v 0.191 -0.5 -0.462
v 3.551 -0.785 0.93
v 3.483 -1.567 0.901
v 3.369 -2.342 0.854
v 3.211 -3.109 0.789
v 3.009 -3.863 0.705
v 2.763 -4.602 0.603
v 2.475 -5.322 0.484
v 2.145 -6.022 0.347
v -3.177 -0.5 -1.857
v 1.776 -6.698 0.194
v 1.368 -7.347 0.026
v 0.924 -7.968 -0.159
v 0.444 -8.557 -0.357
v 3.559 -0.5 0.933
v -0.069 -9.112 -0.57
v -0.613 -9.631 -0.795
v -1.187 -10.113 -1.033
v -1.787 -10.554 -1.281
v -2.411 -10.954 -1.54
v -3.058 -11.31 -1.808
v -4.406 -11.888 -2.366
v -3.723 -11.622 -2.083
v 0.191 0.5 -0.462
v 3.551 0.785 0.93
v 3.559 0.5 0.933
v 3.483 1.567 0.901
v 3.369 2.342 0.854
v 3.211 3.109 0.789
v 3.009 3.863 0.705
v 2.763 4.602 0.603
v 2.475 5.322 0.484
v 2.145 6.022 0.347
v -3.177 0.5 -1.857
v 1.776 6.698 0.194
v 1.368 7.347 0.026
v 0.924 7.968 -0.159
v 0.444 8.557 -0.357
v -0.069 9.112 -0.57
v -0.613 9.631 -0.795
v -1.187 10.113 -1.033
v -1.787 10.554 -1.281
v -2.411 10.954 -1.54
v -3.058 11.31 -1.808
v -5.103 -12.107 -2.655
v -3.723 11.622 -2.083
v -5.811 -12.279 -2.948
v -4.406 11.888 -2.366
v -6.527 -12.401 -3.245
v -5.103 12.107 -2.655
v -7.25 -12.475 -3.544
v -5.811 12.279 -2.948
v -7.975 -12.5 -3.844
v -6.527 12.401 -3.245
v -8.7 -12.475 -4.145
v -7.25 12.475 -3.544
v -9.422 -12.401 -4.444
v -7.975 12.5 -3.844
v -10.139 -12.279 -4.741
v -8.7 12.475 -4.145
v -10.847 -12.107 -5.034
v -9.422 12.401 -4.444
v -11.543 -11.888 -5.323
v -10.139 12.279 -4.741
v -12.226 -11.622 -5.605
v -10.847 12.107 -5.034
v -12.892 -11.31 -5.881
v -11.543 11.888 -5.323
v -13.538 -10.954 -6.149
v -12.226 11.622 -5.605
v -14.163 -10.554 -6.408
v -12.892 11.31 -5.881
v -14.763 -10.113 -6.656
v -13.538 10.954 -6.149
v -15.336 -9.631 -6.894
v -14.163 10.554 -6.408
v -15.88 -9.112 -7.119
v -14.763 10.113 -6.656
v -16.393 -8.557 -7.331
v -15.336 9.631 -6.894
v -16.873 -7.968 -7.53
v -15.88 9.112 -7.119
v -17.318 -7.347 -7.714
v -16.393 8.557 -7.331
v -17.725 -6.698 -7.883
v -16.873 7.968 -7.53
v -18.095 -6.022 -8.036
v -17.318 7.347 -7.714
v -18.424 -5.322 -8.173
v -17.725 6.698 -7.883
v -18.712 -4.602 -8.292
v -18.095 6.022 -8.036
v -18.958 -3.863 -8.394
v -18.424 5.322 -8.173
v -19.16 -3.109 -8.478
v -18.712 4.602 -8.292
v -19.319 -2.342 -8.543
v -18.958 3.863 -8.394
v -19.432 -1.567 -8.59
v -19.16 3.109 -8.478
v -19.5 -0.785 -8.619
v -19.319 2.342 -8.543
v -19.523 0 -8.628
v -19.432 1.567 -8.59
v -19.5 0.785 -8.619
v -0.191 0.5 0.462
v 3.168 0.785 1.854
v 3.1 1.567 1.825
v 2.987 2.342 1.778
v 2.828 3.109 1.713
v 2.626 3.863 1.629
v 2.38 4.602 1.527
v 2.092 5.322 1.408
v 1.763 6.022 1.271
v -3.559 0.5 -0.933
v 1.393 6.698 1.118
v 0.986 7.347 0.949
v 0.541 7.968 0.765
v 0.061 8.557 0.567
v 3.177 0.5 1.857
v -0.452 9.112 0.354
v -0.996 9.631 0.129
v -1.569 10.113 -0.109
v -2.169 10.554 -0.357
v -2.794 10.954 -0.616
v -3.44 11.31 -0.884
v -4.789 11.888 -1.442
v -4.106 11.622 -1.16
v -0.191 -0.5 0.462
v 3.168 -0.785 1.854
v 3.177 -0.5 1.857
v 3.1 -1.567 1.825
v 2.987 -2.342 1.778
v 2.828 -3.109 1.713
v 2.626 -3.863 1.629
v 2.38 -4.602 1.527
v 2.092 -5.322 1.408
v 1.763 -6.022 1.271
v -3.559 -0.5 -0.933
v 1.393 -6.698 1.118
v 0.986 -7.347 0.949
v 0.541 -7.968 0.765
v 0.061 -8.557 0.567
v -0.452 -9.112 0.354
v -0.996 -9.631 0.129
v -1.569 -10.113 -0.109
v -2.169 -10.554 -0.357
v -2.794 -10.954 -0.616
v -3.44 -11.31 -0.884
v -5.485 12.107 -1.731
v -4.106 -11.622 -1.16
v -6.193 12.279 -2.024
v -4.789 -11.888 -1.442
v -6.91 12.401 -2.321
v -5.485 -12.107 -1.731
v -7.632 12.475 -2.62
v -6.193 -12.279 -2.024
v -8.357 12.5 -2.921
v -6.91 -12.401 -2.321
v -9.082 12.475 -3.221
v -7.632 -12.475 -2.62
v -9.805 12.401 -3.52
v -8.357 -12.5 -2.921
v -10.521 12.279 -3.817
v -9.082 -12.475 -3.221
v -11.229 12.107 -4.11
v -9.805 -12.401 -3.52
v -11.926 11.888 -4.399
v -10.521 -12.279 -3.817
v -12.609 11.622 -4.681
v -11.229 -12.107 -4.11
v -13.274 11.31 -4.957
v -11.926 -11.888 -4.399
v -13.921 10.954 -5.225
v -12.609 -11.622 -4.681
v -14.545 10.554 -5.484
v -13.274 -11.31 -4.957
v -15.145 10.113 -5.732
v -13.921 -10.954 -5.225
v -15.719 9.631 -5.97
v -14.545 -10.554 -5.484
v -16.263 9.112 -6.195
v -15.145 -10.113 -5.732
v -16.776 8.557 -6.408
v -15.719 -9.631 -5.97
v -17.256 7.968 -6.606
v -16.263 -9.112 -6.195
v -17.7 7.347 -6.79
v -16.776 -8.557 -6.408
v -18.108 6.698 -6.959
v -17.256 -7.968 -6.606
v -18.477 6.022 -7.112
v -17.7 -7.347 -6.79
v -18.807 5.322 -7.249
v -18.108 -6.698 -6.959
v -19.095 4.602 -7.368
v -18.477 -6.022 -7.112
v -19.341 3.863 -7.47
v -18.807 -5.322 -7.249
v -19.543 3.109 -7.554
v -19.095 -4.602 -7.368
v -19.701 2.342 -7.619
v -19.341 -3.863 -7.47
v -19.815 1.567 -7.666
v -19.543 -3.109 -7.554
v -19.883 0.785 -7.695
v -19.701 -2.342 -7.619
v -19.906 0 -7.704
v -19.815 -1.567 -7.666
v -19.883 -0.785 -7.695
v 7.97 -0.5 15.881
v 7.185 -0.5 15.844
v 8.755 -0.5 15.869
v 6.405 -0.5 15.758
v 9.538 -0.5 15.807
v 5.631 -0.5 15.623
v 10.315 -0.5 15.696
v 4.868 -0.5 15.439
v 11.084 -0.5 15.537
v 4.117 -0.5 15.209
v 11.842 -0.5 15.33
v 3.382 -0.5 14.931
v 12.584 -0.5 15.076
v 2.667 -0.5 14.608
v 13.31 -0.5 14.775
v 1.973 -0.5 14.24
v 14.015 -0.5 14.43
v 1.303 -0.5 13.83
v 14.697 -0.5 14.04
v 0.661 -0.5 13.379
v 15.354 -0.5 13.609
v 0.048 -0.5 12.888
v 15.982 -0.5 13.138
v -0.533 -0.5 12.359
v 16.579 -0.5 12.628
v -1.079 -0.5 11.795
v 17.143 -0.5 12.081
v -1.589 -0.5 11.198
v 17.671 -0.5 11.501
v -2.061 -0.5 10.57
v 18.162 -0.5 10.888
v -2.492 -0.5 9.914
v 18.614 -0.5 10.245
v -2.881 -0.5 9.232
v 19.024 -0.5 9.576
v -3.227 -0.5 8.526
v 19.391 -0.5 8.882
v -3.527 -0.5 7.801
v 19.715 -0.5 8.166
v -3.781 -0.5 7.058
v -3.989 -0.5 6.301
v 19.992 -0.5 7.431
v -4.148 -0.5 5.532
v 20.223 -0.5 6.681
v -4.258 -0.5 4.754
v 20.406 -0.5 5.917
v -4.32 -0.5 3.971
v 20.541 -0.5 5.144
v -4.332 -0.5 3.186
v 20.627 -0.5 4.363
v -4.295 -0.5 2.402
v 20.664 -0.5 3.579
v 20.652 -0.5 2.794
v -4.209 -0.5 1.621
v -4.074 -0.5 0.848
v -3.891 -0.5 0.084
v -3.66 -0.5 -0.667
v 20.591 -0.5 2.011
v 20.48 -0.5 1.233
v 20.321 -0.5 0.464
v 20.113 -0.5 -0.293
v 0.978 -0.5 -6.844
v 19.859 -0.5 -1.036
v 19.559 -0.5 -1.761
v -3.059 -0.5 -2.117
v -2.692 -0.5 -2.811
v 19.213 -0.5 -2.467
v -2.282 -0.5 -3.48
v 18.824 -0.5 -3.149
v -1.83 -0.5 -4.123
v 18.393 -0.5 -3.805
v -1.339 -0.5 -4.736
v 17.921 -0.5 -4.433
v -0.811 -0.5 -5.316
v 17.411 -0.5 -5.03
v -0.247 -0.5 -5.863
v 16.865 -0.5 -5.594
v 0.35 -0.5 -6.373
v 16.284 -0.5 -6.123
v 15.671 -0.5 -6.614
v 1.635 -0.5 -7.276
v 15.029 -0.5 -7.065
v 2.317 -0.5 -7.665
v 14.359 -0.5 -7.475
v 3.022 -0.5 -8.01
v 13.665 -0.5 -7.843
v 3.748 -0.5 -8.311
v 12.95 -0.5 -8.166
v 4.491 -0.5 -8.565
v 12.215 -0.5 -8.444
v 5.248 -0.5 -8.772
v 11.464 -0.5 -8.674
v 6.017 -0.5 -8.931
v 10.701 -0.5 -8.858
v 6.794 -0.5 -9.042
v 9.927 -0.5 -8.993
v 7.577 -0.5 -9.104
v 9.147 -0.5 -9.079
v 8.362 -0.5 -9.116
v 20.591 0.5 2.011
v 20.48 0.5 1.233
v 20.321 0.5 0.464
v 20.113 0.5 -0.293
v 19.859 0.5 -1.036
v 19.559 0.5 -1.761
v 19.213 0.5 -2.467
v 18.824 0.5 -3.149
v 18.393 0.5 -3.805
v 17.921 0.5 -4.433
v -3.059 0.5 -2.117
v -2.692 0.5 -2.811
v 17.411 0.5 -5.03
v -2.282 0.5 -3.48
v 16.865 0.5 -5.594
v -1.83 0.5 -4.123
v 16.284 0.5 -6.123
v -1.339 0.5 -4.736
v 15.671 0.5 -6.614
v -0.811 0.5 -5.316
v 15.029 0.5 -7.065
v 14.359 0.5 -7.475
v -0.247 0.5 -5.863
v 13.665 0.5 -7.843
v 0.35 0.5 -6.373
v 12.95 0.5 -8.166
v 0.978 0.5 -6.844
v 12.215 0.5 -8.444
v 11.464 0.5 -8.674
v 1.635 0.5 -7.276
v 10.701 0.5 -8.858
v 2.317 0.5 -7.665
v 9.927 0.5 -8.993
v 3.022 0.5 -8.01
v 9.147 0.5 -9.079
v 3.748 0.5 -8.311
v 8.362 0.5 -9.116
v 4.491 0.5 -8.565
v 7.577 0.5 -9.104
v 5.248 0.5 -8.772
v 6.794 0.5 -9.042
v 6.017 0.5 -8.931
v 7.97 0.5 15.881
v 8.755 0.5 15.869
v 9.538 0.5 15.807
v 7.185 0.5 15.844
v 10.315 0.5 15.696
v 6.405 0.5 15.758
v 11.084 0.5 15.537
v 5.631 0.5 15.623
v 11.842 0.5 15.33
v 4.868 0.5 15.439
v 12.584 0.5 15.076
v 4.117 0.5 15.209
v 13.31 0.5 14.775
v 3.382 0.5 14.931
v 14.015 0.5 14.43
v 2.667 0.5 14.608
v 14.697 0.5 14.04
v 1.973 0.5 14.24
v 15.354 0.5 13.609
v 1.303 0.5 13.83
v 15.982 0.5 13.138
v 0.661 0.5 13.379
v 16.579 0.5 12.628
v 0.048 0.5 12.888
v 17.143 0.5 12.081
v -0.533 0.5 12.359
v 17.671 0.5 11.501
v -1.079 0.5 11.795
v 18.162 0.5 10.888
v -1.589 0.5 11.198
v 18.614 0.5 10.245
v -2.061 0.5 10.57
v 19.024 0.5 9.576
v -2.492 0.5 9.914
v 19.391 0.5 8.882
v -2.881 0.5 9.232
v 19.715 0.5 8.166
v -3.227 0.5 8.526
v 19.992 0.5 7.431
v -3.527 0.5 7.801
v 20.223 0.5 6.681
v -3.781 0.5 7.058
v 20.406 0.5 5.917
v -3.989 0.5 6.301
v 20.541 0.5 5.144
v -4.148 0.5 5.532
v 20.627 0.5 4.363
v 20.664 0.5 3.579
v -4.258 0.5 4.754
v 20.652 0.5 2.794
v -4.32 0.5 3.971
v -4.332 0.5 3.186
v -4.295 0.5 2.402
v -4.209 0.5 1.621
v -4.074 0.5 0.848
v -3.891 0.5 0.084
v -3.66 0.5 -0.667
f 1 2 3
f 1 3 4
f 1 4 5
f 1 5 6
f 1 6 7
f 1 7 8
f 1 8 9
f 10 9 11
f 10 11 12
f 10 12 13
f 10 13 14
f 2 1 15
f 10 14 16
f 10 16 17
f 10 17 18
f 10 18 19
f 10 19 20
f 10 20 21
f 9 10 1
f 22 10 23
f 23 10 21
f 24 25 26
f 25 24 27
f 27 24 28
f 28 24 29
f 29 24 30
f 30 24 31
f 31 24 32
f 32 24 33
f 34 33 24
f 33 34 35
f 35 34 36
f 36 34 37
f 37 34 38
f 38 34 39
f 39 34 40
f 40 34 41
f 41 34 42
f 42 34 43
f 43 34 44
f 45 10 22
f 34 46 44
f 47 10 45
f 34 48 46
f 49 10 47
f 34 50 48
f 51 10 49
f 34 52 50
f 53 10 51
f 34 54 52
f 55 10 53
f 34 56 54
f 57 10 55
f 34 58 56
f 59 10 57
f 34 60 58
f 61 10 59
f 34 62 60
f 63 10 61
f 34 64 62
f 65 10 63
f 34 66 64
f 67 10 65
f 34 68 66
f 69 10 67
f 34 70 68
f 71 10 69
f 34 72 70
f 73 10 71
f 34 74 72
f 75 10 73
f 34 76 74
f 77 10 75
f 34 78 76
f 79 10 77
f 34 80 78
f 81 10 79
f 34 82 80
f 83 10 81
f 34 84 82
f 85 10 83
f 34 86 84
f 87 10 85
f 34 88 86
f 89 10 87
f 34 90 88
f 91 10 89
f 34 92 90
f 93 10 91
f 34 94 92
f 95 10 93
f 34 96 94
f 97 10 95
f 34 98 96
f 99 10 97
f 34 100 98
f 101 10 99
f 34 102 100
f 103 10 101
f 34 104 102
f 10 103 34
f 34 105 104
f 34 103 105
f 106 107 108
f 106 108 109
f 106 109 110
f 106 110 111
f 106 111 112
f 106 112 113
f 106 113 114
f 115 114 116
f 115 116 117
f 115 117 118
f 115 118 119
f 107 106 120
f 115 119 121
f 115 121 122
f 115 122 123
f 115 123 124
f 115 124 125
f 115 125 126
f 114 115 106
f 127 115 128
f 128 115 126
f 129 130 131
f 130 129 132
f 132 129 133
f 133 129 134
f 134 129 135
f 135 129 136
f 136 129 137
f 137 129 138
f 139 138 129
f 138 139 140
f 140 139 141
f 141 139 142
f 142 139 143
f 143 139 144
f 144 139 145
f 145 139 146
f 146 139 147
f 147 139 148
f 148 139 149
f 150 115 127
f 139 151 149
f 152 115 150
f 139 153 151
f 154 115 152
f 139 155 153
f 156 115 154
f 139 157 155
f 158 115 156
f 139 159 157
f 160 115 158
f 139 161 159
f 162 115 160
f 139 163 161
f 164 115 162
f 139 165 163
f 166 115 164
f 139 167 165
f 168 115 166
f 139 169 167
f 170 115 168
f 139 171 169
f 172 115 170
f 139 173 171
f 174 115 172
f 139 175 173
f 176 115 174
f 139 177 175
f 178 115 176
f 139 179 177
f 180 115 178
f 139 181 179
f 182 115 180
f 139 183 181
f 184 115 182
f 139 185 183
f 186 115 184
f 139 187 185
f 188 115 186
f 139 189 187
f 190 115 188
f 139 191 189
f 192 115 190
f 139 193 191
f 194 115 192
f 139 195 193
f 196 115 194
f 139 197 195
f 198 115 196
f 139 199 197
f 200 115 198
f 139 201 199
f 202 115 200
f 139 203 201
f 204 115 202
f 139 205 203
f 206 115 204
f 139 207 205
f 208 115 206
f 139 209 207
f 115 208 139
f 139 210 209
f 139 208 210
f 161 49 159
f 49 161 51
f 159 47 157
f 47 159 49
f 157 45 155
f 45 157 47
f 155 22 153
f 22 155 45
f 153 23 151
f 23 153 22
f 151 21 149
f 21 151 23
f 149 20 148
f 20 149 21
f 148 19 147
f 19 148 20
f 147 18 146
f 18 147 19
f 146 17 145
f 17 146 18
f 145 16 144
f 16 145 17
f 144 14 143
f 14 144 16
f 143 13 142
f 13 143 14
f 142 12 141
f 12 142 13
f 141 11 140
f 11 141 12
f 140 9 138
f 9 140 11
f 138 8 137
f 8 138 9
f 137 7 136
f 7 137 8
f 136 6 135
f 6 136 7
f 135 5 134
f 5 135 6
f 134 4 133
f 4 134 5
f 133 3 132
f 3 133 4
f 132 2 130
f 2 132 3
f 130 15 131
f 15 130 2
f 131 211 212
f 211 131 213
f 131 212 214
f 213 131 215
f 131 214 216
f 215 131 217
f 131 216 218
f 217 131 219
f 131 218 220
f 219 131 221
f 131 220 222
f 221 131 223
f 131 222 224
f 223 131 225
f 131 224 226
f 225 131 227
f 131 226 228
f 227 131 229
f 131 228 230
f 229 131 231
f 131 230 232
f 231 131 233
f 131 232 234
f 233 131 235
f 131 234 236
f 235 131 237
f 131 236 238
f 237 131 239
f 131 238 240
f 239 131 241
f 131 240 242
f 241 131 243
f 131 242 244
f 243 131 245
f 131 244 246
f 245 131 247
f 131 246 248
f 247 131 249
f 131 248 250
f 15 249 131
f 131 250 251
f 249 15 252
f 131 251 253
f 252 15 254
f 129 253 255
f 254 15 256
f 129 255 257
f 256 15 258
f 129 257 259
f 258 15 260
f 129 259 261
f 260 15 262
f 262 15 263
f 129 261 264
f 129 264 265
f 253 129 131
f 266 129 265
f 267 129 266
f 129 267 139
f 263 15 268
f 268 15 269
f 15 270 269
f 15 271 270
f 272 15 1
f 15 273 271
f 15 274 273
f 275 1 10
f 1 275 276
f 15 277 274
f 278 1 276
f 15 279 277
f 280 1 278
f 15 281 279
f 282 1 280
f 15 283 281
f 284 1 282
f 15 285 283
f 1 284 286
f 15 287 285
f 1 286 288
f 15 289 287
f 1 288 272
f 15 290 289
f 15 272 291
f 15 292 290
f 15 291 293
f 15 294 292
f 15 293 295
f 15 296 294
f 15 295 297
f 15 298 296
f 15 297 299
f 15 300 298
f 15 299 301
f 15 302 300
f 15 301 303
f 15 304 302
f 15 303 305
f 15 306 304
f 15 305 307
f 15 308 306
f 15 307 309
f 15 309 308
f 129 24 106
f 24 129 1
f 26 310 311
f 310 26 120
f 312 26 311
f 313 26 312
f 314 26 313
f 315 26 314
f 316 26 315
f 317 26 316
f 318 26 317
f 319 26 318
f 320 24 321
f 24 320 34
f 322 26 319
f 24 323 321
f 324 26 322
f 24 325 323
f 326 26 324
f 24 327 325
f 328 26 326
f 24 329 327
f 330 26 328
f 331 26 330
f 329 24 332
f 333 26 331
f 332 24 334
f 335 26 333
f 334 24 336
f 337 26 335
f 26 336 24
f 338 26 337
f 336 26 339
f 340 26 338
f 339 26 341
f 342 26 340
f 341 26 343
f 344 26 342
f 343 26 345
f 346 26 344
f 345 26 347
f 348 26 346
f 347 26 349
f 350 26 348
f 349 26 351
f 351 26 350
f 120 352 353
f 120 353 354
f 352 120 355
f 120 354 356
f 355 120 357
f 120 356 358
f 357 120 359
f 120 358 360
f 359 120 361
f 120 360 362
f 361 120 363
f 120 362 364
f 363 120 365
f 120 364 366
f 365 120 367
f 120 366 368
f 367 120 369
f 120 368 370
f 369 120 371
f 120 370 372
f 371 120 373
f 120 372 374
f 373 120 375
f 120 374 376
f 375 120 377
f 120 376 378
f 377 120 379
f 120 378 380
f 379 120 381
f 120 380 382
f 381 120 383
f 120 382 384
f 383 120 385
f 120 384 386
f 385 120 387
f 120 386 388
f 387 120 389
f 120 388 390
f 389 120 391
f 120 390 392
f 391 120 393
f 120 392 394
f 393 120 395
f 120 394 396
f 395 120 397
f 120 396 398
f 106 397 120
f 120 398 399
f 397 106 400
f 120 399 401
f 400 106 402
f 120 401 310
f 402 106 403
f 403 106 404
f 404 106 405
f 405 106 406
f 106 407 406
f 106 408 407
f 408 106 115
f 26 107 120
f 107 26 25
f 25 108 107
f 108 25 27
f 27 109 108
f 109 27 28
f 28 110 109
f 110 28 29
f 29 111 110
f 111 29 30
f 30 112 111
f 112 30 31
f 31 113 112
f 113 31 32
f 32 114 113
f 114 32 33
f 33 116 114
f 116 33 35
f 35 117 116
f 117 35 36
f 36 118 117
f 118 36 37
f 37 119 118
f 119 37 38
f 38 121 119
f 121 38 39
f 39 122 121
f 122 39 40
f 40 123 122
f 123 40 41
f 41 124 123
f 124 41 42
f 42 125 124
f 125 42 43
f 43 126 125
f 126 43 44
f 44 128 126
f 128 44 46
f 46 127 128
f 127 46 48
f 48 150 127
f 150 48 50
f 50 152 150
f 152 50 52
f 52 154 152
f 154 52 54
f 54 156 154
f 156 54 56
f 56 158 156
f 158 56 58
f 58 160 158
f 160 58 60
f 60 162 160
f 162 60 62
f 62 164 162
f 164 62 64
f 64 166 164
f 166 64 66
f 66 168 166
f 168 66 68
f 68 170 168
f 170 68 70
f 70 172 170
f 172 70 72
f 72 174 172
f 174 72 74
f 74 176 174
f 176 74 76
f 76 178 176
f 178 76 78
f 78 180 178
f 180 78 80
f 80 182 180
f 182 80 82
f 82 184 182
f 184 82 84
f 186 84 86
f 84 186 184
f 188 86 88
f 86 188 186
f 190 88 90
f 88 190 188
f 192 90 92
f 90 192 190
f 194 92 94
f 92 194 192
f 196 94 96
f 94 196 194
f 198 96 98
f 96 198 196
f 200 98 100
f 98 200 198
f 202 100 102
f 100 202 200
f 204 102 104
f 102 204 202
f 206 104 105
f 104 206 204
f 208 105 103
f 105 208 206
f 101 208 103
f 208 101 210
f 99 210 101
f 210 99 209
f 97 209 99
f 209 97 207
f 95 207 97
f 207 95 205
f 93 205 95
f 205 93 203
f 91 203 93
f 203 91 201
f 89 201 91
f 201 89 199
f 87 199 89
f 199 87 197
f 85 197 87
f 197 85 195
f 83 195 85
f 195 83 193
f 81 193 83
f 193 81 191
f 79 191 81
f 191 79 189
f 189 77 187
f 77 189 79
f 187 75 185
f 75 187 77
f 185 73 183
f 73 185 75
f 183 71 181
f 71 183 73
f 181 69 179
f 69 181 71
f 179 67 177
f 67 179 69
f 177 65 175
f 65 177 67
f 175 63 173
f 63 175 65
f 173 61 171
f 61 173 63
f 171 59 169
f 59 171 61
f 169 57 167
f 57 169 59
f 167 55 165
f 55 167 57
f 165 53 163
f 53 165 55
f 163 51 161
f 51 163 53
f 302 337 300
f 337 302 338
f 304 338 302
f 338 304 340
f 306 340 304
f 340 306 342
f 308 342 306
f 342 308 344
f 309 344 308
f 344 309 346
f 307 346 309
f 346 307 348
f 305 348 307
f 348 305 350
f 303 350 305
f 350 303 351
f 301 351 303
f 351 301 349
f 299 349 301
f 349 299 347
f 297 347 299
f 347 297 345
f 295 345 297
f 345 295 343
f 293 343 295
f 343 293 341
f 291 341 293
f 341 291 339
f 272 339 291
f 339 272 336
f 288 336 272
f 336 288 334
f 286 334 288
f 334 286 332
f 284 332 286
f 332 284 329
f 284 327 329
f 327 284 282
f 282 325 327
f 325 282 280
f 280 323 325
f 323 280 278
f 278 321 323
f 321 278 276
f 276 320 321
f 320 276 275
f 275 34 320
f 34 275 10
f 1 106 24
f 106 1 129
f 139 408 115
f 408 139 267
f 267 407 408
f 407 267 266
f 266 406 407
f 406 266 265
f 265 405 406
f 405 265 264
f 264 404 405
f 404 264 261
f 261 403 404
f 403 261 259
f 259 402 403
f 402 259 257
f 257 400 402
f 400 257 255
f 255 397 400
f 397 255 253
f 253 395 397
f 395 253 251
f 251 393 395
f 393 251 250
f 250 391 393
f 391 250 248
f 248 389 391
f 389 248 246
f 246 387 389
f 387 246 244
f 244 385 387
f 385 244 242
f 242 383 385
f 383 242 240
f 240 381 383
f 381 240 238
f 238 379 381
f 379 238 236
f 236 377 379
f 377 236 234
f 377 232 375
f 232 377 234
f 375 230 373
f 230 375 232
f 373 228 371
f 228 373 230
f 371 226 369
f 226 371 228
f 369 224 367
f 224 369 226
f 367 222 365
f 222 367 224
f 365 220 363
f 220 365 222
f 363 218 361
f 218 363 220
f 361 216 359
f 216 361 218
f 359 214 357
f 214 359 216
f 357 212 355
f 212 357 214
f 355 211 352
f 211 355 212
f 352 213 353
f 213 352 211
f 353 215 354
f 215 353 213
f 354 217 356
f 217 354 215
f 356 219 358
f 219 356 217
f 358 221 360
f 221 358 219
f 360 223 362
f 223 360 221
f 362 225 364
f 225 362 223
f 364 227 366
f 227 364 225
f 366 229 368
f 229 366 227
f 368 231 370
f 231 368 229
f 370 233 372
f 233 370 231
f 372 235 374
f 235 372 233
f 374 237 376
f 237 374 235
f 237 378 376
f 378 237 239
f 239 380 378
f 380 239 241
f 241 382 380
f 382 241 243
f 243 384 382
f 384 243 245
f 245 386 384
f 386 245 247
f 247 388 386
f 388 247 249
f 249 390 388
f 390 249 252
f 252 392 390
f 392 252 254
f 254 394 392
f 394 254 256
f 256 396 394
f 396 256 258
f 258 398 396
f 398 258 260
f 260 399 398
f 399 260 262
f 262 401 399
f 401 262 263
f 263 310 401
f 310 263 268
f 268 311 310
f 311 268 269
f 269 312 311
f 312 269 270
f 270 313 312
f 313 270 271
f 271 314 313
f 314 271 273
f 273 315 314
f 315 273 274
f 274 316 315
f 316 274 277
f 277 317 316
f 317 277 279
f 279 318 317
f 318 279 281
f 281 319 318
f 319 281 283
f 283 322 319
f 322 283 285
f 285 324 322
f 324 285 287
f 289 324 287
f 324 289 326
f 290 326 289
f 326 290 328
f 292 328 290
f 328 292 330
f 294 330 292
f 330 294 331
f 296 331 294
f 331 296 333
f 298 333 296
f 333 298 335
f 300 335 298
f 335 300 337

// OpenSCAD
//Variables for customizer
// preview[view:south, tilt:top diagonal]

//The (typically larger) diameter of an ellipse (mm)
major_diameter = 25; //[10:100]

//When 1000, minor dia=major dia. (ratio*1000)
minor_diameter_ratio = 1000; //[500:1414.2] 

//Thickness of the material (mm)
thickness = 1; //[1,2,5]

//How to orient the ellipses
Display = "3D"; //[3D, Flat]

/* [Animation] */
//Time step
time = 0; //[0:100]

/* [Hidden] */
//Detail ($fn)
$fn=100; 

$t = time / 100;
if(Display == "3D")
	PerpendicularRollingEllipses(majorDia = major_diameter, minorDia = major_diameter*minor_diameter_ratio / 1000, thickness = thickness, cut=false);
else
	PerpendicularRollingEllipses(majorDia = major_diameter, minorDia = major_diameter*minor_diameter_ratio / 1000, thickness = thickness, cut=true);


//Limit: sqrt(2)*a <= b, or separation between centers becomes complex (not a real solution)

//Interesting objects:
//1. Rolls in two directions; b=sqrt(2)*a; no displacement between centers
//PerpendicularRollingEllipses(majorDia = 2 * inch, minorDia = 2*sqrt(2)*inch, thickness = 1);
//2. b == a; circle (not ellipse); Displacement=sqrt(2)*radius
//PerpendicularRollingEllipses(majorDia = 2 * inch, minorDia = 2*inch, thickness = 1);
//3. b < a
//PerpendicularRollingEllipses(majorDia = 2 * inch, minorDia = 1.2*inch, thickness = 1);



module PerpendicularRollingEllipses(
majorDia = 2 * inch,
minorDia = 2*inch,
thickness = 3,
cut = false
)
{
	
	//From "How Round is Your Circle"
	//Chapter 13 "Finding Some Equilibrium"
	//Page 35 of 44
	
	//separation (mm) = sqrt(4a^2 - 2b^2)

	assign(a=majorDia / 2, b = minorDia / 2)
	{
		assign(separation = sqrt(4*pow(a,2) - 2*pow(b, 2)))
		{
			//assign(minorDia = 2*b)
			{
				echo("Separation: ", separation);
				echo("Major radius: ",a);
				echo("Minor radius: ",b);
				echo("Slot depth: ", a - separation/2);
				echo("Slot fraction of radius: ", (a - separation/2)/a);
				
				
				
				if(cut)
				{
					translate([0, b+1, 0])
					SlottedEllipse(a, b, separation, thickness);
					
					translate([0, -b-1, 0])
					SlottedEllipse(a, b, separation, thickness);
				}
				else
				{
					rotate([360*$t,-cos(720*$t)*atan2(a, separation+a),0])
					{
						translate([-separation/2, 0, -thickness/2])
						linear_extrude(height=thickness)
						SlottedEllipse(a, b, separation, thickness);
					
						translate([separation/2, 0 , 0])
						rotate([90,0,180])
						translate([0, 0, -thickness/2])
						linear_extrude(height=thickness)
						SlottedEllipse(a, b, separation, thickness);
					}
				}
				*cube([7.439, 5, 5], center=true);
			}
		}
	}
	
}

module SlottedEllipse(major = 1*inch, minor = 0.5*inch, separation=0.25 * inch, thickness = 3)
{
	difference()
	{
		Ellipse(major, minor);
		//circle(r=separation-major);
		//circle(r=1);
		
		rotate([0,0,-90])
		translate([0, major/2 + separation / 2, 0])
		square([thickness, major], center=true);
	}
}

module Ellipse(major = 1*inch, minor = 0.5*inch)
{
	scale([1, minor/major, 1])
	circle(major);
}



include <MCAD/units.scad>
